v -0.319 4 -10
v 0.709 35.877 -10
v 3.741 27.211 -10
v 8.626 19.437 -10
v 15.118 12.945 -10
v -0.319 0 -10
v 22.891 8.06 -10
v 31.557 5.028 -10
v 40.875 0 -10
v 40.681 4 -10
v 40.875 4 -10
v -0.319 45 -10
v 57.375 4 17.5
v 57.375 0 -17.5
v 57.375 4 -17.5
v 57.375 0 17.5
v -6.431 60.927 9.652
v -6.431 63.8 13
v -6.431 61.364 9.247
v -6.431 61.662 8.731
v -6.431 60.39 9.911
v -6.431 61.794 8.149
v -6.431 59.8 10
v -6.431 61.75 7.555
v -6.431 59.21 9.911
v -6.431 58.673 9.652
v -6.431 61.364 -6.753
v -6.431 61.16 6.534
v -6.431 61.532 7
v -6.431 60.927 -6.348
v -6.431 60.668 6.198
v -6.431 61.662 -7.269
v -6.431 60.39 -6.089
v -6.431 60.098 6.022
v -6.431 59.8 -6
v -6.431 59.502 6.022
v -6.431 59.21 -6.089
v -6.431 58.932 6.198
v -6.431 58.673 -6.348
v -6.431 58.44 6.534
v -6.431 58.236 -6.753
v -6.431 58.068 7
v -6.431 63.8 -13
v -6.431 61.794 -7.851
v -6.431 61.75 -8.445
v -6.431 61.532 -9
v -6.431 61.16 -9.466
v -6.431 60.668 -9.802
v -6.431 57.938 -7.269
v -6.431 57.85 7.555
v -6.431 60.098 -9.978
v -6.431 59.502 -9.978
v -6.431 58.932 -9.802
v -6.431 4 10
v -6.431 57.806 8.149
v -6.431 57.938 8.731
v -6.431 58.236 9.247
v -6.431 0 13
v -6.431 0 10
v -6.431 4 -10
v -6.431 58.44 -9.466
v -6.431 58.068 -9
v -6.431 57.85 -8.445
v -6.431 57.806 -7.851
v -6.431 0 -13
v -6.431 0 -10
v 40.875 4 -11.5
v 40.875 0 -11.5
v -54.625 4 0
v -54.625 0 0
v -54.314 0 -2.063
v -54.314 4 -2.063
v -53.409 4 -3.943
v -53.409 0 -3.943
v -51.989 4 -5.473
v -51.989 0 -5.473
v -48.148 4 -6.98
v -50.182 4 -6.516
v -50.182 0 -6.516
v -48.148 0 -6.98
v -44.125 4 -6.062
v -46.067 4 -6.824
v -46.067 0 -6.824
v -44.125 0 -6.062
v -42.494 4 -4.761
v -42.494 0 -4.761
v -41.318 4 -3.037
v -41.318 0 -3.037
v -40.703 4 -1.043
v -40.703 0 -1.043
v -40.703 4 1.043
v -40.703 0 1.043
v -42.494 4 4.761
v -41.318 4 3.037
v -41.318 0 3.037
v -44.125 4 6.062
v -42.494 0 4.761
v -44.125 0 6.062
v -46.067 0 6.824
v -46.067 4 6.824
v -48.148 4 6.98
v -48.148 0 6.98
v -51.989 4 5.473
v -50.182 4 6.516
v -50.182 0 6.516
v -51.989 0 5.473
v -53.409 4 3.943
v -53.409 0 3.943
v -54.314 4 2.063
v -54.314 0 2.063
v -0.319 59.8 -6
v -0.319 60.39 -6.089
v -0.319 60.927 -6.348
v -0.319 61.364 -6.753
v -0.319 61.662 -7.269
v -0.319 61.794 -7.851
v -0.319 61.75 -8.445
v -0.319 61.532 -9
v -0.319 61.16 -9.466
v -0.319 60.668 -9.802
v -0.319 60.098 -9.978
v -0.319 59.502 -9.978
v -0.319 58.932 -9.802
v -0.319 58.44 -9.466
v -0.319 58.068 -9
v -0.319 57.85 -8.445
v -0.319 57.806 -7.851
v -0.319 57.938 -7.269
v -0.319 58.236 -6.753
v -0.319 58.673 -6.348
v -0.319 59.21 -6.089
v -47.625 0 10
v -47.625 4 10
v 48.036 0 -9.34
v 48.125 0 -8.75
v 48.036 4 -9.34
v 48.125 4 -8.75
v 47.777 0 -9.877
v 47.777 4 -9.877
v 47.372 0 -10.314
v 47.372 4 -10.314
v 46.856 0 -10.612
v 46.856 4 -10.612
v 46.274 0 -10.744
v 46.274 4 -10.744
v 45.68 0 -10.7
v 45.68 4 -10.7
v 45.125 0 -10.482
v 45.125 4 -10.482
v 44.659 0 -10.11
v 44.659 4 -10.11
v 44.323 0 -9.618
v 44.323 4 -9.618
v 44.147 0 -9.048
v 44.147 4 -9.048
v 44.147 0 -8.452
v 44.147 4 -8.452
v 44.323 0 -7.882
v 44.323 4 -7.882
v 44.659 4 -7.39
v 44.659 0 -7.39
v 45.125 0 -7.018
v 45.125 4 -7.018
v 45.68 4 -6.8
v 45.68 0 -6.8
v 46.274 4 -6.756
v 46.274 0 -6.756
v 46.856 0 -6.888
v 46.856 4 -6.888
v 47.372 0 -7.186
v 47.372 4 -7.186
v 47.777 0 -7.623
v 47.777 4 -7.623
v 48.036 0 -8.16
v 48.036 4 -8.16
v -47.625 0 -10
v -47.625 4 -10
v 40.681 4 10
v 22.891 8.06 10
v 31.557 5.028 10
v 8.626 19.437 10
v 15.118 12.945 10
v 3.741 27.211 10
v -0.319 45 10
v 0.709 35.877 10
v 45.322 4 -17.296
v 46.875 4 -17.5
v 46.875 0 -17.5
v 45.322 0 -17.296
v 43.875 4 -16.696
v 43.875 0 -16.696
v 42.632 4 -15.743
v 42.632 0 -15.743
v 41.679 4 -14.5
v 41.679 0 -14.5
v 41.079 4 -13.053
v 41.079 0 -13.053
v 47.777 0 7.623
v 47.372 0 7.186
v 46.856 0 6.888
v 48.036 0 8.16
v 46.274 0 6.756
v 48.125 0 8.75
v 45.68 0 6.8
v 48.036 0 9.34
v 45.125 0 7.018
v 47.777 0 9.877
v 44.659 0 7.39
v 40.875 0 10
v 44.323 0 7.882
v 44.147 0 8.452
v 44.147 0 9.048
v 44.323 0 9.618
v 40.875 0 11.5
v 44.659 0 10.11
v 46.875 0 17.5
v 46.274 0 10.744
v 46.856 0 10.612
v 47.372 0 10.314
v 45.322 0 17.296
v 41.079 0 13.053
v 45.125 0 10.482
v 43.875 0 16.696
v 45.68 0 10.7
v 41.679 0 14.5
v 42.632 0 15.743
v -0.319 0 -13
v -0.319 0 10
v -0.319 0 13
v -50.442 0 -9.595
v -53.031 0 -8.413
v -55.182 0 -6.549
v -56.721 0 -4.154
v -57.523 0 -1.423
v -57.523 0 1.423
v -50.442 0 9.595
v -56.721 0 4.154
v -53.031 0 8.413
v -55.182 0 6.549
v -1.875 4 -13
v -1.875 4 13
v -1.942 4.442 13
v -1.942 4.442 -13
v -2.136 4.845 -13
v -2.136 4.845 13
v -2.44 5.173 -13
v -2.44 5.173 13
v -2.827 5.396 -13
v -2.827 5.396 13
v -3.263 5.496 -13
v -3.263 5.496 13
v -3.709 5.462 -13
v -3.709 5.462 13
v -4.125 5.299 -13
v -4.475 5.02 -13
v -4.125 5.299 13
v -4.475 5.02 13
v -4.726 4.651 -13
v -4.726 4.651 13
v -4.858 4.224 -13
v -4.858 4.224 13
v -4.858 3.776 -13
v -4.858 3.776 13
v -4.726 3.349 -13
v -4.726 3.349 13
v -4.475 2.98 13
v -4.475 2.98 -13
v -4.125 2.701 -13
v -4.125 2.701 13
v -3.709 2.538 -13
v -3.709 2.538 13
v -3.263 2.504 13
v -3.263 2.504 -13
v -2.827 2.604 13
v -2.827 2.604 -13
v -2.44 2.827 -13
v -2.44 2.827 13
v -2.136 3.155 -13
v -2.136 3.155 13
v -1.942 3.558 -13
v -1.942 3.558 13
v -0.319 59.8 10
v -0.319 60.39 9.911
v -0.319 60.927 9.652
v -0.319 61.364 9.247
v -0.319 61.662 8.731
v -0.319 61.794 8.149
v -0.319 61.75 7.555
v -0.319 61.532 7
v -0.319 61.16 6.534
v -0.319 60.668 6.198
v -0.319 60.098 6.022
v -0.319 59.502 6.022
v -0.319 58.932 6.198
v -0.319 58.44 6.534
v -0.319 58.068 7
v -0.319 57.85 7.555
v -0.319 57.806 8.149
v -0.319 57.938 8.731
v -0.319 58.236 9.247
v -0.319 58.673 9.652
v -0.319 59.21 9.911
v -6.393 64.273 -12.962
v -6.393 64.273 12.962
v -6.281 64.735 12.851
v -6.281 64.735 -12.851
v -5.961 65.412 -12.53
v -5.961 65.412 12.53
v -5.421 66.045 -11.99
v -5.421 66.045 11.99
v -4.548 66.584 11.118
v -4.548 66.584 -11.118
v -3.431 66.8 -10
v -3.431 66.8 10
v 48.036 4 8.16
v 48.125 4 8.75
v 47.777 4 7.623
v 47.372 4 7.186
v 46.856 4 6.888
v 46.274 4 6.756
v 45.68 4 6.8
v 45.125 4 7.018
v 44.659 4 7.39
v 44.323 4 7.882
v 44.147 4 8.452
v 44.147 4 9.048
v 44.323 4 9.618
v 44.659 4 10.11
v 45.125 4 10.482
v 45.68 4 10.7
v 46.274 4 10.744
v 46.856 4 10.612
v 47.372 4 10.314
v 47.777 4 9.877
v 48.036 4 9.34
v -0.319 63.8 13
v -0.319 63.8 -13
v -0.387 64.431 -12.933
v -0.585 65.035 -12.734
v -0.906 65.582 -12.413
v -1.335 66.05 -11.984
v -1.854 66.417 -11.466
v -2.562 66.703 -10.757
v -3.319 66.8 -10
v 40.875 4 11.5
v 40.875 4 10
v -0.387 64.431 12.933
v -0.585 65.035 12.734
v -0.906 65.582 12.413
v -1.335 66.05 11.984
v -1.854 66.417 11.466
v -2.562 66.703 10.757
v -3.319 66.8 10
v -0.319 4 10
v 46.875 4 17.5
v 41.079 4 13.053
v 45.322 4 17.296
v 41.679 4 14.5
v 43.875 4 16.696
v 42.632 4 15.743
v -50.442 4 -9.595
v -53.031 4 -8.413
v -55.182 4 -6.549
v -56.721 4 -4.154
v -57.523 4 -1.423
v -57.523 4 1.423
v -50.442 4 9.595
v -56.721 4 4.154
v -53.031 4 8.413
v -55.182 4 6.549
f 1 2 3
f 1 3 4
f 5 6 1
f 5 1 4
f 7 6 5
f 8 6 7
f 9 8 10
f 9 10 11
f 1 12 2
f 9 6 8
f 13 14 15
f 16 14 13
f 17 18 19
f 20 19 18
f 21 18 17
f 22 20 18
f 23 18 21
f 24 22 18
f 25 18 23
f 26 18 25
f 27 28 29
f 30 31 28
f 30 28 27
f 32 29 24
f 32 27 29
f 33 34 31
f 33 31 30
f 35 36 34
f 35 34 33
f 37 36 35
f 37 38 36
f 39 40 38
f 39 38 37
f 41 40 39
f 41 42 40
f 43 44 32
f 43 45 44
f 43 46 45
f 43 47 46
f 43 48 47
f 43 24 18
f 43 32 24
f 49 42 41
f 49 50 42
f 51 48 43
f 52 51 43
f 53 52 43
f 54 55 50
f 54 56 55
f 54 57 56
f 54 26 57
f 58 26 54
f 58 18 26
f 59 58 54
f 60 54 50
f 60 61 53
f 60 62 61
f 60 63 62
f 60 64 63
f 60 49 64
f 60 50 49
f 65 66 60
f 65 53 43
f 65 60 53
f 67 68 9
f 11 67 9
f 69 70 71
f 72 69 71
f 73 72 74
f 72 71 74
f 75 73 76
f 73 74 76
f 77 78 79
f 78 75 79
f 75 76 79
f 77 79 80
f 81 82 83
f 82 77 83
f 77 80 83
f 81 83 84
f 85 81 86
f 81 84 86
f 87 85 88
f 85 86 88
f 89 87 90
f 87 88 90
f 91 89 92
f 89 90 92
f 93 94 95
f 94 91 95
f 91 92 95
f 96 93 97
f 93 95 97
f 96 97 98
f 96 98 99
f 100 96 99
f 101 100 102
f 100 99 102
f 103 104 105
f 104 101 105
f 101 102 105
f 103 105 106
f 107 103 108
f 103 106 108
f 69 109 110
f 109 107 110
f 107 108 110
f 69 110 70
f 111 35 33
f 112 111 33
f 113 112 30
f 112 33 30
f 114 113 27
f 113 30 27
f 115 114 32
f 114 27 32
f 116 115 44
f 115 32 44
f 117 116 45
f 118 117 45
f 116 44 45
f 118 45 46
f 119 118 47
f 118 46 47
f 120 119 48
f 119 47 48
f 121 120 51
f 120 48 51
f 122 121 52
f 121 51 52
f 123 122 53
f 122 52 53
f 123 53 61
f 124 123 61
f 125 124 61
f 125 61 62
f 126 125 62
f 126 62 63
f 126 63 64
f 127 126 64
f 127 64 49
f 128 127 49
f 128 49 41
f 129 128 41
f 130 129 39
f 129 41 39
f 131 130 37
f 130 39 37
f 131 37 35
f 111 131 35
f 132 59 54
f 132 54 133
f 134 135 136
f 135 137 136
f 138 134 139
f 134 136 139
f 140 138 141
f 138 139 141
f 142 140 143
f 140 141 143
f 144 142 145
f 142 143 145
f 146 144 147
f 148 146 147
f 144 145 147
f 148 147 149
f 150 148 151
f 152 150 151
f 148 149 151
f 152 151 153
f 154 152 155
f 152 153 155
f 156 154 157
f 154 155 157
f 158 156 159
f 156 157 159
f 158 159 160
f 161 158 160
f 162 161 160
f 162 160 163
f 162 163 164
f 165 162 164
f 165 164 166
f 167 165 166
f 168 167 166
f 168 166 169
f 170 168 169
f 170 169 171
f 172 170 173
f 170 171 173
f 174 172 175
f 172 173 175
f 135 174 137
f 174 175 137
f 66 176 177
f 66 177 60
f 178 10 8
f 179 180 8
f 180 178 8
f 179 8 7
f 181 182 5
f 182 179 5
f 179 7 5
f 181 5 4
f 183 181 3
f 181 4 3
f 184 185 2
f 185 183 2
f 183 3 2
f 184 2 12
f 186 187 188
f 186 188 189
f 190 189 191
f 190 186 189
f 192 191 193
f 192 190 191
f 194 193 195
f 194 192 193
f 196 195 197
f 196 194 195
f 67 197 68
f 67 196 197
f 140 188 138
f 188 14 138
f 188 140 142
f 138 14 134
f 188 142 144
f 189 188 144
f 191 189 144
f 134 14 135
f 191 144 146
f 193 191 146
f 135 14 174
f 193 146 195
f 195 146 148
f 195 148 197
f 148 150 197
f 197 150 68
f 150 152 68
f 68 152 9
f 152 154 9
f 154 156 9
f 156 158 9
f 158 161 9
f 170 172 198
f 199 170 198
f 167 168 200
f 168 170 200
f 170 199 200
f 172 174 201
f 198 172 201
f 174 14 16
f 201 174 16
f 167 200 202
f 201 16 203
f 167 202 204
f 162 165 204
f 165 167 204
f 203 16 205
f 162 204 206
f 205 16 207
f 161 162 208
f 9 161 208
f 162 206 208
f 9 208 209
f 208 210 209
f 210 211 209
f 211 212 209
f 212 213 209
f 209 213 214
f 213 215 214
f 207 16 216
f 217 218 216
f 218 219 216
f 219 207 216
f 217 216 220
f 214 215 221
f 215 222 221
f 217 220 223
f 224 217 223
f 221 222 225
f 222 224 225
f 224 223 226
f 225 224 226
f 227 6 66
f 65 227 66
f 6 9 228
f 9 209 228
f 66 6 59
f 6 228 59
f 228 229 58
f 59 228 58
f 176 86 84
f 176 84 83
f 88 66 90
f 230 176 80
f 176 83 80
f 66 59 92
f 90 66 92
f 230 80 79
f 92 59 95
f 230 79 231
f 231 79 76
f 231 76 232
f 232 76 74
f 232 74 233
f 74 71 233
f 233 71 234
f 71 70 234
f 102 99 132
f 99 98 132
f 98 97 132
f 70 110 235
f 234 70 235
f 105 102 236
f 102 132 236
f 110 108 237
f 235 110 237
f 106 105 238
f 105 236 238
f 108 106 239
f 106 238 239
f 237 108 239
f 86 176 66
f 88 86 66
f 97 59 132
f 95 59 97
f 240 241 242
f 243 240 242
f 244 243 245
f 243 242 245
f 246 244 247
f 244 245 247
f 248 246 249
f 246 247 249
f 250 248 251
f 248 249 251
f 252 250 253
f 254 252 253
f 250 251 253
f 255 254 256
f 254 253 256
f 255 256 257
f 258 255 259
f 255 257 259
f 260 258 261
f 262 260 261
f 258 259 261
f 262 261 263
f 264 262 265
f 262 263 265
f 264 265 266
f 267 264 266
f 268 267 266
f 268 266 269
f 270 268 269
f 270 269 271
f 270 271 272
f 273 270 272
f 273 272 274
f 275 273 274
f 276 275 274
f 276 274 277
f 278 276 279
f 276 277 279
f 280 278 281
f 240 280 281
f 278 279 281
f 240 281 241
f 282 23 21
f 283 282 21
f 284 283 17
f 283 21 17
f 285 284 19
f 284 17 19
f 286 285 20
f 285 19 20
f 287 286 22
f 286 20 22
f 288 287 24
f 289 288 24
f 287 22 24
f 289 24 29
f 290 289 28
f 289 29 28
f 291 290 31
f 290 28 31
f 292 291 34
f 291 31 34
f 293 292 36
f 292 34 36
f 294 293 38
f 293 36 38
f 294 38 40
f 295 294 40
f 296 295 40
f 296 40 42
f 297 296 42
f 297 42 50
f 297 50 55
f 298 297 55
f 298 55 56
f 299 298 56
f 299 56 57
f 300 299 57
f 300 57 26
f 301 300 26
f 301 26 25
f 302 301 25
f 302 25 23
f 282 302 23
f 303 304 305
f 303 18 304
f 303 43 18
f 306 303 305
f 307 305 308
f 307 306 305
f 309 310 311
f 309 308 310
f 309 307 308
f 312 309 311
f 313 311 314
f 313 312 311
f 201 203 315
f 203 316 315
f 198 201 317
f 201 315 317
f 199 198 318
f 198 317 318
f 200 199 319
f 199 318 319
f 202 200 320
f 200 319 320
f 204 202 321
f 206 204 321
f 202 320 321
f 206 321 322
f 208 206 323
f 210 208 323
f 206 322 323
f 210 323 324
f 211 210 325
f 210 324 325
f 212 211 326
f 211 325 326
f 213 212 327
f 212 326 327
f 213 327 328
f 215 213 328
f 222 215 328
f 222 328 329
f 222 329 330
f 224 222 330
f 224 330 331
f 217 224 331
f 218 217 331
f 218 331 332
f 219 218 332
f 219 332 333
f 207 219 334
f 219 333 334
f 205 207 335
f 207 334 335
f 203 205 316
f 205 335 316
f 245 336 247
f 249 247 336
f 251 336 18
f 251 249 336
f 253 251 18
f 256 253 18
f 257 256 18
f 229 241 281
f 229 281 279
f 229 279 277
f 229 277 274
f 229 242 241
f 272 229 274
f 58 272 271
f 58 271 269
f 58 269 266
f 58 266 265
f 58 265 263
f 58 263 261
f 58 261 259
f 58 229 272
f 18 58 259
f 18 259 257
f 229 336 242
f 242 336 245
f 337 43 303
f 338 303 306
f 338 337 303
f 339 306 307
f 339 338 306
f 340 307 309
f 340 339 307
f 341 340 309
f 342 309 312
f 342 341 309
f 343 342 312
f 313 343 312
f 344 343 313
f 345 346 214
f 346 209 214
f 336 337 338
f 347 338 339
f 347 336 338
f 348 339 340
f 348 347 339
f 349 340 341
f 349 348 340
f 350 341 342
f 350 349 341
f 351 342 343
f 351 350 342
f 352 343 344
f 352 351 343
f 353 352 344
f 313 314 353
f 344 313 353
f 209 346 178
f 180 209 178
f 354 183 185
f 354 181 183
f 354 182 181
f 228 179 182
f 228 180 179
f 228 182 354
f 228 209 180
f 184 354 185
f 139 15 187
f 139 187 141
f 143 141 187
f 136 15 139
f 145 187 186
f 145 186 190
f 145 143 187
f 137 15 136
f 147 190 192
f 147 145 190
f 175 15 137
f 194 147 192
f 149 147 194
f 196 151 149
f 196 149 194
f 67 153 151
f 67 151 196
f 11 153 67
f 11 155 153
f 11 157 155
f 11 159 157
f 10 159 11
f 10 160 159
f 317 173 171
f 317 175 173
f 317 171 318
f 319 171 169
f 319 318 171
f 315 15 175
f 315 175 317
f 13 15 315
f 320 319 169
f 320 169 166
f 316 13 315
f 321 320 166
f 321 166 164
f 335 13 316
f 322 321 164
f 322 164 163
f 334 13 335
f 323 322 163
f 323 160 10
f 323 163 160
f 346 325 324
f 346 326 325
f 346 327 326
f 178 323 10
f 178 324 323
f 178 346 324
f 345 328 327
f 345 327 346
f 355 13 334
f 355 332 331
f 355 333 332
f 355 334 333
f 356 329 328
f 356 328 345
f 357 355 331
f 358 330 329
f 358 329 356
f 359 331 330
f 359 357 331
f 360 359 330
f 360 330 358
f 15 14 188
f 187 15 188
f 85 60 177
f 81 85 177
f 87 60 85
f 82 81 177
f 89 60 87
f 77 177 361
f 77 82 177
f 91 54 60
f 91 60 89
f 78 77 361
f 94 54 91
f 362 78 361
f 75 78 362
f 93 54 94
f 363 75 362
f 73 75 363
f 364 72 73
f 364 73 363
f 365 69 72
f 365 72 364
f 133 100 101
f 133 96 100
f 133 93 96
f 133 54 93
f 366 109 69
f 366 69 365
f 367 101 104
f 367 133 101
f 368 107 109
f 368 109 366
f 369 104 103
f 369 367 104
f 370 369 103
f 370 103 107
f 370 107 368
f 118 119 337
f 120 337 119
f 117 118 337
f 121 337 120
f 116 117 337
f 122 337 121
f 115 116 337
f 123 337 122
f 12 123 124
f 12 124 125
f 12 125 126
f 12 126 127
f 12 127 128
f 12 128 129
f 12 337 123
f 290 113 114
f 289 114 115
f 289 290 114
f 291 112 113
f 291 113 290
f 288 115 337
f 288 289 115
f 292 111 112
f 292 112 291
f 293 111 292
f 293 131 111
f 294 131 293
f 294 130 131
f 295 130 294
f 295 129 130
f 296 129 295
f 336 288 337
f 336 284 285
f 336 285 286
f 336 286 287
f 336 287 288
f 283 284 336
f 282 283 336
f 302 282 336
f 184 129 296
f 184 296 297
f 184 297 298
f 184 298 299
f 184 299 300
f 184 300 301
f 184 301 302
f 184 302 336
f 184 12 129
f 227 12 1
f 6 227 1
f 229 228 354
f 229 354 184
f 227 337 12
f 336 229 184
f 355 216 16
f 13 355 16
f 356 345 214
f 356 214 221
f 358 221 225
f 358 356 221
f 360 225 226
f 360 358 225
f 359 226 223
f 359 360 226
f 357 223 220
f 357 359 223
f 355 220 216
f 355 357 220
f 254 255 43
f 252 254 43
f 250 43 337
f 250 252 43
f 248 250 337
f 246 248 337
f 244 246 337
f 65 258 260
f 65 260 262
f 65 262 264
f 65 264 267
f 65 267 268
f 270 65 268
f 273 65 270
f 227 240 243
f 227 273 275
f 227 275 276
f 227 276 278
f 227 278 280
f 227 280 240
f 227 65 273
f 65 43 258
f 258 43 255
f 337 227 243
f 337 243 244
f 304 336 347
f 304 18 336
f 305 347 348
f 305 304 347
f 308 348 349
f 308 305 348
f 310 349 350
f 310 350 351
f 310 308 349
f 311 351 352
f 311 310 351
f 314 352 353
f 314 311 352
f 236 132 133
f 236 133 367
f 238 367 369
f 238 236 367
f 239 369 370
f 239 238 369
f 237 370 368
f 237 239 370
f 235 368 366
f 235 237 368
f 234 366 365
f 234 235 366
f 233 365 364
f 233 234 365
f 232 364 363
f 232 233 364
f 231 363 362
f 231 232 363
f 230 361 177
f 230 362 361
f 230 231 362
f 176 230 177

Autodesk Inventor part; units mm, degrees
ref_plane "YZ Plane" through (0, 0, 0) normal (1, 0, 0) x (0, 1, 0)
ref_plane "XZ Plane" through (0, 0, 0) normal (0, 1, 0) x (-1, 0, 0)
ref_plane "XY Plane" through (0, 0, 0) normal (0, 0, 1) x (1, 0, 0)
sketch "Main Sketch" plane through (0, 0, 0) normal (0, 1, 0) x (-1, 0, 0)
  line L0 (-57.375, -12.0472) -> (-57.375, 12.0472)
  line L1 (-57.375, 12.0472) -> (47.625, -10) construction
  line L2 (47.625, 10) -> (-57.375, -12.0472) construction
  circle A0 centre (47.625, 0) radius 7
  arc A1 (47.625, -10) -> (47.625, 10) centre (47.625, 0) ccw
  line L3 (-40.875, 17.5) -> (-57.375, 17.5)
  line L4 (-57.375, 17.5) -> (-57.375, -17.5)
  line L5 (-57.375, -17.5) -> (-40.875, -17.5)
  line L6 (-40.875, 17.5) -> (-57.375, -17.5) construction
  line L7 (-57.375, 17.5) -> (-40.875, -17.5) construction
  line L8 (47.625, -10) -> (-40.875, -10)
  line L9 (-40.875, -17.5) -> (-40.875, -10)
  line L10 (-40.875, 10) -> (-40.875, 17.5)
  line L11 (-40.875, 10) -> (47.625, 10)
  point P0 (0, 0)
  point P1 (-49.125, 0)
  dimension "d3" = 14
  dimension "d4" = 105
  dimension "d13" = 16.5
  dimension "d14" = 35
  dimension "d15" = 0
  dimension "d18" = 20
extrude "Main Extrusion" add sketch "Main Sketch" along normal blind 4
sketch "Screw Holes Sketch" plane through (0, 4, 0) normal (0, 1, 0) x (1, 0, 0)
  circle A0 centre (46.125, -8.75) radius 2
  line L0 (57.375, 17.5) -> (40.875, 17.5) projected
  line L1 (40.875, -17.5) -> (57.375, -17.5) projected
  line L2 (35.2664, 0) -> (65.7891, 0)
  line L3 (51.375, -27.0398) -> (51.375, 30.2346) construction
  line L4 (57.375, -17.5) -> (57.375, 17.5) projected
  line L5 (40.875, -10) -> (40.875, -17.5) projected
  circle A1 centre (46.125, 8.75) radius 2
  line L6 (51.375, 27.0398) -> (51.375, -30.2346) construction
  point P0 (0, 0)
  dimension "d21" = 4
  dimension "d22" = 35
  dimension "d23" = 6
  dimension "d24" = 5.25
  dimension "d25" = 5.25
  dimension "d26" = 10.5
  dimension "d27" = 8.75
  dimension "d28" = 17.5
extrude "Screw Holes Cut" cut sketch "Screw Holes Sketch" against normal through all
fillet "Smoooooooooooooooooth" radius 6 2 edges at (40.875, 2, -17.5) (40.875, 2, 17.5)
sketch "Side Axel Hole Sketch" plane through (-47.625, 0, 10) normal (0, 0, 1) x (1, 0, 0)
  line L0 (88.5, 4) -> (88.5, 0) projected
  line L1 (0, 0) -> (0, 4) projected
  line L2 (44.25, -12.0383) -> (44.25, 22.7681) construction
  line L3 (88.5, 0) -> (0, 0) projected
  line L4 (0, 4) -> (88.5, 4) projected
  circle A0 centre (44.25, 4) radius 1.5
  point P0 (47.625, 0)
  dimension "d32" = 88.5
  dimension "d33" = 44.25
  dimension "d34" = 44.25
  dimension "d35" = 4
  dimension "d41" = 3
sketch "Sketch7" plane through (0, 4, 0) normal (0, 1, 0) x (1, 0, 0)
  line L0 (-47.625, -10) -> (40.875, -10) construction
  line L1 (-3.375, -10) -> (-3.375, 33.3565) construction
  line L2 (-0.3194, -13) -> (-6.4306, -13)
  line L3 (-6.4306, -13) -> (-6.4306, 13)
  line L4 (-6.4306, 13) -> (-0.3194, 13)
  line L5 (-0.3194, 13) -> (-0.3194, -13)
  line L6 (-0.3194, -13) -> (-6.4306, 13) construction
  line L7 (-6.4306, -13) -> (-0.3194, 13) construction
  point P0 (0, 0)
  point P1 (-3.375, 0)
  dimension "d47" = 26
extrude "Servo Mount Extrusion" add sketch "Sketch7" along normal blind 62.8 and the other way blind 4
extrude "Side Axel Cut" cut sketch "Side Axel Hole Sketch" along normal through all both and the other way through all contours A0 L4 | L4 A0
sketch "Sketch8" plane through (-6.4306, 4, -10) normal (-1, 0, 0) x (0, 0, 1)
  line L0 (23, 62.8) -> (23, -4) construction
  line L1 (-3, 62.8) -> (23, 62.8) construction
  line L2 (-3, 62.8) -> (-3, -4) construction
  circle A0 centre (2, 55.8) radius 2
  circle A1 centre (18, 55.8) radius 2
  point P0 (10, -4)
  dimension "d54" = 4
  dimension "d55" = 4
  dimension "d56" = 16
  dimension "d57" = 7
  dimension "d58" = 7
  dimension "d59" = 5
  dimension "d60" = 5
extrude "Mount Holes Cut" cut sketch "Sketch8" against normal through all
fillet "Support" radius 41 1 edges at (-0.3194, 4, 0)
fillet "lil hat" radius 3 4 edges at (-0.3194, 66.8, 0) (-3.375, 66.8, -13) (-6.4306, 66.8, 0) (-3.375, 66.8, 13)
properties part number "TapeMeasureBracketSideServo"
